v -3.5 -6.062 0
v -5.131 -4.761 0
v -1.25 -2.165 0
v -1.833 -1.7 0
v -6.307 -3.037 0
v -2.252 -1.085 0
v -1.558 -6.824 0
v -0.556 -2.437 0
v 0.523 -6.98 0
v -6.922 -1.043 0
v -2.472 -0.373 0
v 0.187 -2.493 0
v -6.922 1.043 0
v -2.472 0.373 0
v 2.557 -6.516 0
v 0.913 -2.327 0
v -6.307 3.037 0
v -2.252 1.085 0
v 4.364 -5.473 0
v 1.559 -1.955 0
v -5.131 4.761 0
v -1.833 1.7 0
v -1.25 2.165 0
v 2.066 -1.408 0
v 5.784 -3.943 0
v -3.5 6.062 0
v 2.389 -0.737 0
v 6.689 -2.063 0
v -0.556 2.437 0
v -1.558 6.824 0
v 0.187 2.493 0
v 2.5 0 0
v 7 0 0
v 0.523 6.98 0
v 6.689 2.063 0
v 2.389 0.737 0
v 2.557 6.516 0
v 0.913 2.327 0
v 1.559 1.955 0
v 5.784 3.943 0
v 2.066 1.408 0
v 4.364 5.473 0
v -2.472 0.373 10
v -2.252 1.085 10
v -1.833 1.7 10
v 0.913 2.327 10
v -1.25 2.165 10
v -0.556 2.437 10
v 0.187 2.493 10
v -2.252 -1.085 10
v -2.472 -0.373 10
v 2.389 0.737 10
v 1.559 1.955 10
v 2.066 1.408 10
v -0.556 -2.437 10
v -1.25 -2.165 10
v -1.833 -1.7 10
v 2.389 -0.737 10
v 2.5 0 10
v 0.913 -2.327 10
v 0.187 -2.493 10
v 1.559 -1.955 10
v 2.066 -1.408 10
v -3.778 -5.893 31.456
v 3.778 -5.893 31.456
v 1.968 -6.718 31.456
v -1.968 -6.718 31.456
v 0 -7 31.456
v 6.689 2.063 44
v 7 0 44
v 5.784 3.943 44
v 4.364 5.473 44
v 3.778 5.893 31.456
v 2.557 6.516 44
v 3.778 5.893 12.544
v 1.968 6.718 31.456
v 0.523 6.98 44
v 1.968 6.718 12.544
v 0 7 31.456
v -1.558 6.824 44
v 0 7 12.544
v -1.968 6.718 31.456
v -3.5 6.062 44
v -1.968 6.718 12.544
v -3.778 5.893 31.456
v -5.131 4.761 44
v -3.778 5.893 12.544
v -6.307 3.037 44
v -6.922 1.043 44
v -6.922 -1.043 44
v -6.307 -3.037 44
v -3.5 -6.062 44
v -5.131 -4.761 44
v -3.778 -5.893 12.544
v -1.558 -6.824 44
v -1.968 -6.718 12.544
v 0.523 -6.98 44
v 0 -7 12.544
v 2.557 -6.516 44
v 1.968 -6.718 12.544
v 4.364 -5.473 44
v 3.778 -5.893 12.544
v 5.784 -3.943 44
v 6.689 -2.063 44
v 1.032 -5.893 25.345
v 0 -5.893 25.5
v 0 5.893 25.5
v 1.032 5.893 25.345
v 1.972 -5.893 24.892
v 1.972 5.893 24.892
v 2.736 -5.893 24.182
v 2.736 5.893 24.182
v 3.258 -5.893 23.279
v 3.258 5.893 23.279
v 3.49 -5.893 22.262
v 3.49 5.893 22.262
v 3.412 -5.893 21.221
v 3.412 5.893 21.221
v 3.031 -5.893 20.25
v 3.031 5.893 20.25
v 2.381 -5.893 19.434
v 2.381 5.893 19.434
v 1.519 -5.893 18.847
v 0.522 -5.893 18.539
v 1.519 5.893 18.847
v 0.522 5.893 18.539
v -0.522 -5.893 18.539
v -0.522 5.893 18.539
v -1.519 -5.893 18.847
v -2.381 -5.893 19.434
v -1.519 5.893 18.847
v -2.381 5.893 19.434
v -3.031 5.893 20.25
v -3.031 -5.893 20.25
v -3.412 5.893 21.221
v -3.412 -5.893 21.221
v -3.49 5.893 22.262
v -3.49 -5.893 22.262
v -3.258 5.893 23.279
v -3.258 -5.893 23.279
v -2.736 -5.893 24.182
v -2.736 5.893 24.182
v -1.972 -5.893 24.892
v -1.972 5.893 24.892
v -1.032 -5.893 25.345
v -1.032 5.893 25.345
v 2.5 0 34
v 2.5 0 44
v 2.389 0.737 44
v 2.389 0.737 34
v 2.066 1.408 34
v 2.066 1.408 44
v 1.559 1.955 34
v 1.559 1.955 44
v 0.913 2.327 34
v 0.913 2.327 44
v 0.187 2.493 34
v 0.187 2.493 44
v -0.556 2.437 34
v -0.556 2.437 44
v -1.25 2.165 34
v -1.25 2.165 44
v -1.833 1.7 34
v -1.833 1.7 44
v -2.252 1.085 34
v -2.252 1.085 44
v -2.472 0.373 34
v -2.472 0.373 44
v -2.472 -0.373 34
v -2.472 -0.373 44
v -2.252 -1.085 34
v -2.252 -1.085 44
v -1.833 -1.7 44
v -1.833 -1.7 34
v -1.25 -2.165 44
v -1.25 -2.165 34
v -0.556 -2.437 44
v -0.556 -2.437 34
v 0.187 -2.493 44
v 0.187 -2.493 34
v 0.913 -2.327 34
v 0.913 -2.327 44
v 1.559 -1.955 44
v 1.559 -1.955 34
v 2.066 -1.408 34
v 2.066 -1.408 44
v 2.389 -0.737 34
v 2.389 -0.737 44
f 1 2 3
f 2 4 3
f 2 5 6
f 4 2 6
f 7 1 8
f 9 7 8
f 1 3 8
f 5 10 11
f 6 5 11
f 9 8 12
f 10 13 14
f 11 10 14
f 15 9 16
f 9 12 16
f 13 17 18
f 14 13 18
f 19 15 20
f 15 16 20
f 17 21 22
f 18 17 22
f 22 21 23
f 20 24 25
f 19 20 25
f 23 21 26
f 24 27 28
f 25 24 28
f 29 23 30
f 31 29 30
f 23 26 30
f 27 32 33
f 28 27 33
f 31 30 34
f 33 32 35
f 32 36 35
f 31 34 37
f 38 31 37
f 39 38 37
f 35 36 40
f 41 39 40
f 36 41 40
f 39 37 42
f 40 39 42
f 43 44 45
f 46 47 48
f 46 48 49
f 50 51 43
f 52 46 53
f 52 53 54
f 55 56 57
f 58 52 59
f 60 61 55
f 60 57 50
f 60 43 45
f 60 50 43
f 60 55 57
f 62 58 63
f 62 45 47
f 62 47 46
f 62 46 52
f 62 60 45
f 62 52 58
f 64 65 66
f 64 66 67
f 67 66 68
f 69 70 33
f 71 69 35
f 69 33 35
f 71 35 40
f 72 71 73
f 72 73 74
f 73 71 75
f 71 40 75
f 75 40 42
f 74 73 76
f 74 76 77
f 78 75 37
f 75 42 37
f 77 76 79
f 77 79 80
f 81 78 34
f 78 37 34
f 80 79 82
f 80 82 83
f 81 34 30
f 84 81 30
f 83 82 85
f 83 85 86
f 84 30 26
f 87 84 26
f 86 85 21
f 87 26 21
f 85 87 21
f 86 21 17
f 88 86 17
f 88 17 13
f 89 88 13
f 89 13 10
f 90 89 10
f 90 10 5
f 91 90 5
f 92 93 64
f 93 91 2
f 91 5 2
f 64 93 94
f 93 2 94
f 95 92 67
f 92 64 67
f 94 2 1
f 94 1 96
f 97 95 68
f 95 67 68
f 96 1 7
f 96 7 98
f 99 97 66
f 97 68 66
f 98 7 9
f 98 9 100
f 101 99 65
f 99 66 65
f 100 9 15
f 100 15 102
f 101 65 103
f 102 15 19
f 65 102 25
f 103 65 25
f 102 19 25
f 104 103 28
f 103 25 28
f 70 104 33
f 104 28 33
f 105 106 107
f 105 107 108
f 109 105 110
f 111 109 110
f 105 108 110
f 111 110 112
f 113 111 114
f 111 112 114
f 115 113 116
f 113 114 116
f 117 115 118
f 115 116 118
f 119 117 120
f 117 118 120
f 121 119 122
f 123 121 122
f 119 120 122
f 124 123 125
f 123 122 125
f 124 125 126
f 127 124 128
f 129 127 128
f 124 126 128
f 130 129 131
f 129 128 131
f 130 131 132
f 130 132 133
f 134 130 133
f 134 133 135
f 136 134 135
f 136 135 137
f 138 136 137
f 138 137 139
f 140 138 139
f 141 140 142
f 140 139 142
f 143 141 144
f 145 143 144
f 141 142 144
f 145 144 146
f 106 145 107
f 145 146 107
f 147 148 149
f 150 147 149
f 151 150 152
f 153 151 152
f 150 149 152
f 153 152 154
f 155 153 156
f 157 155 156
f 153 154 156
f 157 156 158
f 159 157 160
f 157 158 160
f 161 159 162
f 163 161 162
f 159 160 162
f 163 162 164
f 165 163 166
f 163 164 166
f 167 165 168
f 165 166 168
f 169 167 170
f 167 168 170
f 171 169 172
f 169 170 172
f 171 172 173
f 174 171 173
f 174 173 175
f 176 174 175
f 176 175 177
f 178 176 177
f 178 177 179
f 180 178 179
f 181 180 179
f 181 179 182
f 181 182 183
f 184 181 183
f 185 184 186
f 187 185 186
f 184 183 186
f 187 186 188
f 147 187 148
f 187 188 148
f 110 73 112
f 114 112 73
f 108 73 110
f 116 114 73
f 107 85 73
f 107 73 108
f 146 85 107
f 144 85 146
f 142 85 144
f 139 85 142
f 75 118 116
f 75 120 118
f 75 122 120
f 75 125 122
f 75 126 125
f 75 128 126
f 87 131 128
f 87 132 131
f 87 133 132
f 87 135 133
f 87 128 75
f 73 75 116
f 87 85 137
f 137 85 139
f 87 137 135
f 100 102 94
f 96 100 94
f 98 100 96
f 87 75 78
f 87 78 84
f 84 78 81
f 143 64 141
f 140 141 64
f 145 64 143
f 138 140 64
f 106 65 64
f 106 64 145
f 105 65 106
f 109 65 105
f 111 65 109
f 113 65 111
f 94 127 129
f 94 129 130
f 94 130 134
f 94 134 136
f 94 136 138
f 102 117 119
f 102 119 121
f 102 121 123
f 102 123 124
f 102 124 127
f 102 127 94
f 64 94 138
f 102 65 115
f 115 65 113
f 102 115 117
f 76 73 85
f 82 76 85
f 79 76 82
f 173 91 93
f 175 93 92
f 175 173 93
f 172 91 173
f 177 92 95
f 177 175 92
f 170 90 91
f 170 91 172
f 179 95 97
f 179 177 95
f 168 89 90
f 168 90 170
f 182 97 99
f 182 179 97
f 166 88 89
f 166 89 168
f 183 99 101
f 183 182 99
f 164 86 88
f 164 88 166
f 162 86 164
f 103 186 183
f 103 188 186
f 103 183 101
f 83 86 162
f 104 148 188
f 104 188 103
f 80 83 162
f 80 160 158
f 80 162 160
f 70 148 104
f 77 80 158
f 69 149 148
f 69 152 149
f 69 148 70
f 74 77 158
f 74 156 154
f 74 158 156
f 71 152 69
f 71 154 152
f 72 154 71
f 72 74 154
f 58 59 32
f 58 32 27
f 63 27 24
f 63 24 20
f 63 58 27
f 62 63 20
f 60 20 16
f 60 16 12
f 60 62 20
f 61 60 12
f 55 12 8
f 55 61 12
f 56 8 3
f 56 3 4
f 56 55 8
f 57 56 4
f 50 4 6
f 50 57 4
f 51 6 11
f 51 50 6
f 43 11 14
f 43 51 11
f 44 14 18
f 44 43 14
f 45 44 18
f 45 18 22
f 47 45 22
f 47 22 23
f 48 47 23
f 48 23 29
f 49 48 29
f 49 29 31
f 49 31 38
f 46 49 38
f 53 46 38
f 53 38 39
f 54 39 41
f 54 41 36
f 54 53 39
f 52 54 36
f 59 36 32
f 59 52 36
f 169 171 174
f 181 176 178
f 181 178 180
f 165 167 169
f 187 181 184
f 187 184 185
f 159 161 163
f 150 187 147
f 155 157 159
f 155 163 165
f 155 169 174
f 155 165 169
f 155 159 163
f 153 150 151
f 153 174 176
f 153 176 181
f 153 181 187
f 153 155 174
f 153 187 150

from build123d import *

# Parameters (mm, degrees)
SKETCH1_R           = 7
BOSS_EXTRUDE1_DEPTH = 44
SKETCH2_R           = 2.5
CUT_EXTRUDE1_DEPTH  = 10
CUT_EXTRUDE2_START  = -10
SKETCH3_R           = 2.5
CUT_EXTRUDE2_DEPTH  = 10
SKETCH4_R           = 3.5
CUT_EXTRUDE3_DEPTH  = 20
SKETCH5_W           = 18.912740594
SKETCH5_H           = 2.214003862
CUT_EXTRUDE5_DEPTH  = 35


with BuildPart() as part:
    # Sketch1 → Boss-Extrude1 (new body)
    with BuildSketch(Plane.XY):
        Circle(SKETCH1_R)
    extrude(amount=BOSS_EXTRUDE1_DEPTH)

    # Sketch2 → Cut-Extrude1 (cut)
    with BuildSketch(Plane.XY.offset(44)):
        Circle(SKETCH2_R)
    extrude(amount=-CUT_EXTRUDE1_DEPTH, mode=Mode.SUBTRACT)

    # Sketch3 → Cut-Extrude2 (cut)
    with BuildSketch(Plane(origin=(0, 0, 0), x_dir=(-1, 0, 0), z_dir=(0, 0, -1)).offset(CUT_EXTRUDE2_START)):
        with Locations(Location((0, 0, 0), (0, 0, 180))):
            Circle(SKETCH3_R)
    extrude(amount=CUT_EXTRUDE2_DEPTH, mode=Mode.SUBTRACT)

    # Sketch4 → Cut-Extrude3 (cut, symmetric)
    with BuildSketch(Plane(origin=(0, 0, 0), x_dir=(1, 0, 0), z_dir=(0, 1, 0))):
        with Locations(Location((0, -22, 0), (0, 0, 270))):
            Circle(SKETCH4_R)
    extrude(amount=CUT_EXTRUDE3_DEPTH, both=True, mode=Mode.SUBTRACT)

    # Sketch5 → Cut-Extrude5 (cut, symmetric)
    with BuildSketch(Plane(origin=(0, 0, 0), x_dir=(0, 0, -1), z_dir=(1, 0, 0))):
        with Locations((-22, 7)):
            Rectangle(SKETCH5_W, SKETCH5_H)
        with Locations((-22, -7)):
            Rectangle(SKETCH5_W, SKETCH5_H)
    extrude(amount=CUT_EXTRUDE5_DEPTH, both=True, mode=Mode.SUBTRACT)


solid = part.part
